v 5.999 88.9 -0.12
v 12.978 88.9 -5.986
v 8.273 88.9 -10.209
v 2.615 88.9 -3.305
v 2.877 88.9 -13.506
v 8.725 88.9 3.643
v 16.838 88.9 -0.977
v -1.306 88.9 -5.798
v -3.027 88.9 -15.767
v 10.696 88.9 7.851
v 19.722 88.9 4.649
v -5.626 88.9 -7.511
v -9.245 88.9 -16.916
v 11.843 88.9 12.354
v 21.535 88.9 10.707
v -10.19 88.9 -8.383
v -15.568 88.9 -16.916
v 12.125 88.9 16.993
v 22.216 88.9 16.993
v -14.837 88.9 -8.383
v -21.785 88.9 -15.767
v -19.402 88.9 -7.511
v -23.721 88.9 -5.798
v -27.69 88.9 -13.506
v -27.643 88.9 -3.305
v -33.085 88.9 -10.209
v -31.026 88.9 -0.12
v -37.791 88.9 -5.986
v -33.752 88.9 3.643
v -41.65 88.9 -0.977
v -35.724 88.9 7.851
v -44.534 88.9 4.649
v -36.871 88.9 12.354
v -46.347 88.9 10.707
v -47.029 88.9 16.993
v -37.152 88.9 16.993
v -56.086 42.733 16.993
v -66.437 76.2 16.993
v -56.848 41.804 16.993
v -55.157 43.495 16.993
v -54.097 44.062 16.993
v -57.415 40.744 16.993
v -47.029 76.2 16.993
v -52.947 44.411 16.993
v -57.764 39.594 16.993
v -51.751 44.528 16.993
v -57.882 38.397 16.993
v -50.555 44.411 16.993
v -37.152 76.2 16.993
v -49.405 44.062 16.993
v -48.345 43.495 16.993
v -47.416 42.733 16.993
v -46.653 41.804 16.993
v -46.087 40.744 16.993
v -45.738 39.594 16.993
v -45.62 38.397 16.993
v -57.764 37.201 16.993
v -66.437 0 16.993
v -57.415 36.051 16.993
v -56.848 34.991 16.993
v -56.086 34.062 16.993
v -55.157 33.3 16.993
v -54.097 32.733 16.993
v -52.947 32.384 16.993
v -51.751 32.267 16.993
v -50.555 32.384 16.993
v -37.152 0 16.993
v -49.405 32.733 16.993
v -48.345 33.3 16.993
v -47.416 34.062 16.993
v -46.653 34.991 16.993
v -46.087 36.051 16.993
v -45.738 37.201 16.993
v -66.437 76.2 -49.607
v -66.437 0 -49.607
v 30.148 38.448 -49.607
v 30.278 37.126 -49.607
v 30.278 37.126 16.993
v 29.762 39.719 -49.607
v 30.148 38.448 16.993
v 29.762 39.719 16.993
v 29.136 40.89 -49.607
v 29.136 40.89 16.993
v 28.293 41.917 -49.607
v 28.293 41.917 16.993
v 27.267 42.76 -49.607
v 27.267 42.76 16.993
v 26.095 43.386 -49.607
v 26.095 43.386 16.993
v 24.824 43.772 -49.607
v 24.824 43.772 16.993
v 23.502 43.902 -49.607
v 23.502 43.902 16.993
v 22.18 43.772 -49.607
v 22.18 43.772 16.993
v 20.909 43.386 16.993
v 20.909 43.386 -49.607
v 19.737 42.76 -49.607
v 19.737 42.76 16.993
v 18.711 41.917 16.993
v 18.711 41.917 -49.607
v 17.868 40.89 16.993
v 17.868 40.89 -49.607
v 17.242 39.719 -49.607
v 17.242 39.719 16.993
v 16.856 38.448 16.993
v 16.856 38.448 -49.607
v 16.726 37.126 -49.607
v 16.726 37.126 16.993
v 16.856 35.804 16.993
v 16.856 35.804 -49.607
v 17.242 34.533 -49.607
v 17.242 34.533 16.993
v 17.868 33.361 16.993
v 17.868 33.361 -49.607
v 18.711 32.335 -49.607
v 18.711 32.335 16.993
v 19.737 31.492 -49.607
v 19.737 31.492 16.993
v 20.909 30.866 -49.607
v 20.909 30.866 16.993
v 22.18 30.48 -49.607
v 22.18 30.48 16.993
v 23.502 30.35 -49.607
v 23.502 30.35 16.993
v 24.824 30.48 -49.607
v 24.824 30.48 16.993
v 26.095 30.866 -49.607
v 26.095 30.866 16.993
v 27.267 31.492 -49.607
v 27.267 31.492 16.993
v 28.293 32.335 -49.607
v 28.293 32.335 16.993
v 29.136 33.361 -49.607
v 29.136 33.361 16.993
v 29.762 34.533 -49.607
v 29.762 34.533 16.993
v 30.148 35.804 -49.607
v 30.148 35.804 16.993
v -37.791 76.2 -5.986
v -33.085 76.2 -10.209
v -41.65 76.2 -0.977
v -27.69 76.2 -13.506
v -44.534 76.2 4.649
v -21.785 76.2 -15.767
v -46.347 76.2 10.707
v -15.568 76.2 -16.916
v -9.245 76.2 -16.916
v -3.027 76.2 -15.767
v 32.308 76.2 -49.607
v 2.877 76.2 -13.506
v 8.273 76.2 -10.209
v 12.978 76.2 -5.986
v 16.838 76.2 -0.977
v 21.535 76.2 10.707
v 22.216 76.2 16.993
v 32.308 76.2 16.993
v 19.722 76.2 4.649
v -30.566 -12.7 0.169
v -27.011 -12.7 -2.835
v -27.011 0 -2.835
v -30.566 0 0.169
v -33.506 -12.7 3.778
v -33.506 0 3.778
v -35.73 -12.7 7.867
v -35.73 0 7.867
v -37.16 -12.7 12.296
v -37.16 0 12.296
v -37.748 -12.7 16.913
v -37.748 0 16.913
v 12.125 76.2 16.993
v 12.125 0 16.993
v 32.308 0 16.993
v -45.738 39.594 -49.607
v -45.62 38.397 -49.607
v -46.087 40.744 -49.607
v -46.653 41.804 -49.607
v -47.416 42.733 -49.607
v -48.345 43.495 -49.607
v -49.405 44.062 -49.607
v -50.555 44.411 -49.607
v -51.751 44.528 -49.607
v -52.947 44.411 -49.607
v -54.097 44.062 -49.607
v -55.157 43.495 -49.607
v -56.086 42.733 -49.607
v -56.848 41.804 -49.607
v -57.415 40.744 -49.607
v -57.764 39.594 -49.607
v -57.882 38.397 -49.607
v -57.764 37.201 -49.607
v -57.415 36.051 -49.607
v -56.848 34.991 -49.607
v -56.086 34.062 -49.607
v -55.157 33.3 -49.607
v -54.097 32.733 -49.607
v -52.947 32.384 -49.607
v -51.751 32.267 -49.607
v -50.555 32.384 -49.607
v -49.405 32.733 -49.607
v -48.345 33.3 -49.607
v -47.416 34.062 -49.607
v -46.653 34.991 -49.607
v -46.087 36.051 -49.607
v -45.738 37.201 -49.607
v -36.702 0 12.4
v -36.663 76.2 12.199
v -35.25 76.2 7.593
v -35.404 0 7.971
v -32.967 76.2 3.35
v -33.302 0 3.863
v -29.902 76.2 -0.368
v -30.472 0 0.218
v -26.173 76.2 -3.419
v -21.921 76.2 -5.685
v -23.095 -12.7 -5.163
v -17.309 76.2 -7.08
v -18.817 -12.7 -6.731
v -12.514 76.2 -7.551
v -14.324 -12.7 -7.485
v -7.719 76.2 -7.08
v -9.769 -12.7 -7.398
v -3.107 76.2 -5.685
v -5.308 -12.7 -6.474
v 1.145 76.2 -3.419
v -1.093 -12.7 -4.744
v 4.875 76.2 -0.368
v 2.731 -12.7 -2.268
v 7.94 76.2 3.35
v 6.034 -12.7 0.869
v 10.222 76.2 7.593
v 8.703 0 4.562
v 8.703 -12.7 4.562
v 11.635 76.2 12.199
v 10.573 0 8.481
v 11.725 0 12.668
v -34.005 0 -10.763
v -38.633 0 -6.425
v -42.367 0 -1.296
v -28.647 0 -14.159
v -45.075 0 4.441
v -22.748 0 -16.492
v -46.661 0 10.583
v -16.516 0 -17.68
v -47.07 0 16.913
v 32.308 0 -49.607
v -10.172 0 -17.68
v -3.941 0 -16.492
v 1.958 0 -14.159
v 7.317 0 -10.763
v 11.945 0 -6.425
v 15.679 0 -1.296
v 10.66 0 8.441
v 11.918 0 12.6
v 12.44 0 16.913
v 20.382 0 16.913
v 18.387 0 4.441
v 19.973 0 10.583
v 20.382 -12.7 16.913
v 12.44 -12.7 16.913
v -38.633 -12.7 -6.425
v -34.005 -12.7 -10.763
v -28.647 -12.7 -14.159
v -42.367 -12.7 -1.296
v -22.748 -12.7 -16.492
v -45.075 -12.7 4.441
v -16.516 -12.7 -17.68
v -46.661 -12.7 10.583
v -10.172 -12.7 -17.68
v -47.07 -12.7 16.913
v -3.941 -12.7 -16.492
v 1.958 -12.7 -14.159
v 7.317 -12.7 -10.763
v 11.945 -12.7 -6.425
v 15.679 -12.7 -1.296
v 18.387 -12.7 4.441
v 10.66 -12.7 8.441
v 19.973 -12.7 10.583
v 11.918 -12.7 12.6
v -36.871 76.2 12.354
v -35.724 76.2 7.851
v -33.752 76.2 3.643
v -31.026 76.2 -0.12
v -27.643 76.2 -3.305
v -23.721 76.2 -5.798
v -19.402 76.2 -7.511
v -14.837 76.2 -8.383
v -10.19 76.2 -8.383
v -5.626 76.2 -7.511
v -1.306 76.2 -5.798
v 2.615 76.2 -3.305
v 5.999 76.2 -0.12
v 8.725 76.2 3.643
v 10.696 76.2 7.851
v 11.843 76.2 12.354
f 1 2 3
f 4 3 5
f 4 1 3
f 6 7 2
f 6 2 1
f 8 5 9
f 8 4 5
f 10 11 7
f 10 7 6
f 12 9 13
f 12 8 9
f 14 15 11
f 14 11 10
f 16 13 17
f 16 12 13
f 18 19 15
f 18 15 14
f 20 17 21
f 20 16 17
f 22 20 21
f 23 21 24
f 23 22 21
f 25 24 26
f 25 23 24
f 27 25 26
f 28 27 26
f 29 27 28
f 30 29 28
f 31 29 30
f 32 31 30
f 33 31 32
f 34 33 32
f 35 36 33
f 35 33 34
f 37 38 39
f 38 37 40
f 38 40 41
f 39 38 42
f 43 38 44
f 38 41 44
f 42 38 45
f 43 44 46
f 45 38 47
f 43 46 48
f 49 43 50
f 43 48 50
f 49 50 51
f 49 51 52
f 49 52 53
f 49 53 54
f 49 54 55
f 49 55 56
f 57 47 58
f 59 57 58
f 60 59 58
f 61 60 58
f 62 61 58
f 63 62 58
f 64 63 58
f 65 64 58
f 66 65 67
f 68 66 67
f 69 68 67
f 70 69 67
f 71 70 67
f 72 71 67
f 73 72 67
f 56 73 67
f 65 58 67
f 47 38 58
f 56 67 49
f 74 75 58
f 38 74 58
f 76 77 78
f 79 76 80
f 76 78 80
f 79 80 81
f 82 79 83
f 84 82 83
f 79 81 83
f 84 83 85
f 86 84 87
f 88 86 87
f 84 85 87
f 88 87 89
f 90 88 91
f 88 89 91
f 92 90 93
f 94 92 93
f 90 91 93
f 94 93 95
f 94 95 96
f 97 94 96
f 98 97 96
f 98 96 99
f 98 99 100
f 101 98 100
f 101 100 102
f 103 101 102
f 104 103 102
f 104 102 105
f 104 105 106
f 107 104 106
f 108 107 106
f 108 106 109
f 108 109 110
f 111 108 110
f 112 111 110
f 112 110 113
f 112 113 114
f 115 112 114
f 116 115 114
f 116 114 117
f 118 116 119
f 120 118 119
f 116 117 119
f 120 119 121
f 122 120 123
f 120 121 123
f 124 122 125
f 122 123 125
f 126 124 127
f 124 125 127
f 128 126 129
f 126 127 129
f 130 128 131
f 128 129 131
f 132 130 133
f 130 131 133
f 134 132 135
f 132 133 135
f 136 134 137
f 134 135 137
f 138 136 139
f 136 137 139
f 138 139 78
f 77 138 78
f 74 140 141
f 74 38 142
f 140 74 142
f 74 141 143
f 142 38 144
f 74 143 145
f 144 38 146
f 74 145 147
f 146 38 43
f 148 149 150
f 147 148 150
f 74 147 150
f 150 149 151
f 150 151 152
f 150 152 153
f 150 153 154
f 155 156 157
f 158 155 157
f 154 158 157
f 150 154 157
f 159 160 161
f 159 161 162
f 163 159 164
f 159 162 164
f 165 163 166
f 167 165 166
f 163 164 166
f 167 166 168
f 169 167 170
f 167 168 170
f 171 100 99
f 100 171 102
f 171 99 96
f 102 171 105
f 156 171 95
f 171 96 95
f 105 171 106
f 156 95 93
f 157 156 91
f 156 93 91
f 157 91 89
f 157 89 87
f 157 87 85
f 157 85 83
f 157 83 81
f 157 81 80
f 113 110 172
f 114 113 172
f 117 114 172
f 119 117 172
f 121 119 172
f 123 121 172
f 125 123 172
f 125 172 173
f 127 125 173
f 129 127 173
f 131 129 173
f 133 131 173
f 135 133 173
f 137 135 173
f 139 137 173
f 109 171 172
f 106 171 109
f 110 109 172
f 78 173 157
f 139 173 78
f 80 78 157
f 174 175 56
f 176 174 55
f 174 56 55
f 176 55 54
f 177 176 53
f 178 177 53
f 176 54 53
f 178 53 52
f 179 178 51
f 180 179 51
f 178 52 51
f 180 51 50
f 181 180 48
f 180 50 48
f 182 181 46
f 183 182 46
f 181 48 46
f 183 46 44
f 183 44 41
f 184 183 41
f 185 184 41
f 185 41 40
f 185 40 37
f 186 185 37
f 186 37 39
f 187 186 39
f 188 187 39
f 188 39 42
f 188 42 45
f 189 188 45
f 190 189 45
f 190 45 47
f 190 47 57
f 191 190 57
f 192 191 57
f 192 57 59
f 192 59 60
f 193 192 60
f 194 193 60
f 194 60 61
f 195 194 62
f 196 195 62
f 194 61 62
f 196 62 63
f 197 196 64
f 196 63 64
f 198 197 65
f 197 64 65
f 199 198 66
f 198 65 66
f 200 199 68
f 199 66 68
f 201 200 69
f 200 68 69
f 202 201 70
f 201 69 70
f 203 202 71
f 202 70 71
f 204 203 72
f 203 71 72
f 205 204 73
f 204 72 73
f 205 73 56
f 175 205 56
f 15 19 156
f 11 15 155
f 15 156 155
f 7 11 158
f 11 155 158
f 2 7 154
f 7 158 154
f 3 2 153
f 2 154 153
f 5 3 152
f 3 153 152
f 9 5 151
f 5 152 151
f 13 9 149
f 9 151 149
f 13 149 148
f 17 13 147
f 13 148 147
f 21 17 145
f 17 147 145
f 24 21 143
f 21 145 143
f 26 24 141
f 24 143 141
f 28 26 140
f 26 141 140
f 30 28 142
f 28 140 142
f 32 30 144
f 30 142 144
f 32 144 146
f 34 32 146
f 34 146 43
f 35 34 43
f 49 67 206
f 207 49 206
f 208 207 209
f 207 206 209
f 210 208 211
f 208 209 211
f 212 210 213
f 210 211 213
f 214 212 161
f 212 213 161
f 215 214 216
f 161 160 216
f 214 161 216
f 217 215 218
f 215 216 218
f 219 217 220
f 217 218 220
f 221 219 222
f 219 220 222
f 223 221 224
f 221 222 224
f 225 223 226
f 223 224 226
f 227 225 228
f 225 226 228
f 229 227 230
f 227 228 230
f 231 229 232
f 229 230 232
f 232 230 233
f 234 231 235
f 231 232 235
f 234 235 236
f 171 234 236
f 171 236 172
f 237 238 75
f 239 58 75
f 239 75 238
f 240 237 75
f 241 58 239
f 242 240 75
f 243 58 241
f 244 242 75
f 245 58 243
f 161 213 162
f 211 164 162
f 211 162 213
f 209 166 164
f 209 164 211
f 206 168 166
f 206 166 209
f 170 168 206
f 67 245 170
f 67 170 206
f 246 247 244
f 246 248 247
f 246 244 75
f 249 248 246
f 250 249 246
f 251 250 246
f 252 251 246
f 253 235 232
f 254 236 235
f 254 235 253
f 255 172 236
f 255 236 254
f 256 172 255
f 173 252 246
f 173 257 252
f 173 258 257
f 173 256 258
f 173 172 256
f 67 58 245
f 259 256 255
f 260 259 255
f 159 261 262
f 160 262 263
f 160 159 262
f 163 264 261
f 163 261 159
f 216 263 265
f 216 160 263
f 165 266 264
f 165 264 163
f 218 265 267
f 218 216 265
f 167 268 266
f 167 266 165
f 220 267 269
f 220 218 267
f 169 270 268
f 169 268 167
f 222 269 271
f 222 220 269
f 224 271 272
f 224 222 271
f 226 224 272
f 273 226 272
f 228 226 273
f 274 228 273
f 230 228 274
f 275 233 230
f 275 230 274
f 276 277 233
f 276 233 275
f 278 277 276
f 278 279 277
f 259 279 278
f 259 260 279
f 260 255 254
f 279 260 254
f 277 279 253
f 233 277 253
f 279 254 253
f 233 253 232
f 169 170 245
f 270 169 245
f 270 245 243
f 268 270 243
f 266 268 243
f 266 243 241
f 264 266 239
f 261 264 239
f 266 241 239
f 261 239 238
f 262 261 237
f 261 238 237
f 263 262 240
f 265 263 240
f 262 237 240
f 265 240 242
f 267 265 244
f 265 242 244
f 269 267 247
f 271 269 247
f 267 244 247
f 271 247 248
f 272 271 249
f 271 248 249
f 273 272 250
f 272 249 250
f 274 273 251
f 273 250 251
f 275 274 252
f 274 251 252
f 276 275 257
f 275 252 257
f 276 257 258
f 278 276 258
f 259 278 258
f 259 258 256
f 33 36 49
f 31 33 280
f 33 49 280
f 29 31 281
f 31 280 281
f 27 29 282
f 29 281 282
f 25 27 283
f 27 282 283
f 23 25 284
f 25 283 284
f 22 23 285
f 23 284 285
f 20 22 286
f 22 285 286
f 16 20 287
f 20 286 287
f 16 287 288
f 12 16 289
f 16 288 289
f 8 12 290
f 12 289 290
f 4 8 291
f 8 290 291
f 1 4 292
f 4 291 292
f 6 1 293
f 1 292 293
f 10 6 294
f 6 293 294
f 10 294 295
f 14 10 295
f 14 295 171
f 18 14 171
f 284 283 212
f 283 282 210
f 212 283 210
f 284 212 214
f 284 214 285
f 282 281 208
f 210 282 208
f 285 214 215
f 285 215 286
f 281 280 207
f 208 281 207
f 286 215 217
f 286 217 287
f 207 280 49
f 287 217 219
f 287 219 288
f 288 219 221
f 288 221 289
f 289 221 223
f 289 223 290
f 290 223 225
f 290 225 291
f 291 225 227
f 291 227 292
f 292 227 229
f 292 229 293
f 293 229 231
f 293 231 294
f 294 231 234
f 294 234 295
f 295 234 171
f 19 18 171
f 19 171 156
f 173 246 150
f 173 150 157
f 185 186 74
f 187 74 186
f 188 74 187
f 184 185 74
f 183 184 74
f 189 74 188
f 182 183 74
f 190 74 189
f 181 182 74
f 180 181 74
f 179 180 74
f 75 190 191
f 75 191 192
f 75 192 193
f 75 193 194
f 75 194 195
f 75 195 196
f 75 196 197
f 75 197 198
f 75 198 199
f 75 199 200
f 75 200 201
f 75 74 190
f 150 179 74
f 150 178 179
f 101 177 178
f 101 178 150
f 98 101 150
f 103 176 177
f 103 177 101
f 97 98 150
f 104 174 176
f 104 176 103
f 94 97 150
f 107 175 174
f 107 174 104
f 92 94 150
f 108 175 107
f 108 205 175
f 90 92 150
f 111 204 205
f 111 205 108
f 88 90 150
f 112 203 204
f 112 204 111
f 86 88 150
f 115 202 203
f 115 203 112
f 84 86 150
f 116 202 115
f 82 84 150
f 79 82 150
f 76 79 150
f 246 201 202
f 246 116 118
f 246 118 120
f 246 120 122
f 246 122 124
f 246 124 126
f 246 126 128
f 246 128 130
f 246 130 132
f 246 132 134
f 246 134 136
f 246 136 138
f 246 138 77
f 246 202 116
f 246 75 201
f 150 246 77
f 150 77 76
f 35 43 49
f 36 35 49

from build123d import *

# Parameters (mm, degrees)
F0_W          = 98.744937
F0_H          = 66.599365
F1_DEPTH      = 76.2
F4_DEPTH      = 12.7
F5_R          = 24.638622
F6_DEPTH      = 12.7
F6_DEPTH_BACK = 88.9
F7_R          = 6.776006
F7_R_2        = 6.130863
F8_DEPTH      = 66.600365
F10_DEPTH     = 12.7


with BuildPart() as f1:
    # F0 (on Front) → F1 (new body)
    with BuildSketch(Plane.XZ):
        with Locations((-17.064217, -16.306898)):
            Rectangle(F0_W, F0_H)
    extrude(amount=-F1_DEPTH)

    # F3 (on face) → F4 (join)
    with BuildSketch(Plane.XZ):
        with BuildLine():
            ThreePointArc((12.440301, 16.913241), (-12.653938, -7.34435), (-37.748177, 16.913241))
            Line((-37.748177, 16.913241), (-47.070116, 16.913241))
            ThreePointArc((-47.070116, 16.913241), (-13.344199, -17.828973), (20.381717, 16.913241))
            Line((20.381717, 16.913241), (12.440301, 16.913241))
        make_face()
    extrude(amount=F4_DEPTH)

    # F5 (on Front) → F6 (cut, two sides)
    with BuildSketch(Plane.XZ) as f6_sk:
        with Locations((-12.513756, 17.087433)):
            Circle(F5_R)
    extrude(amount=F6_DEPTH, mode=Mode.SUBTRACT)
    extrude(f6_sk.sketch, amount=-F6_DEPTH_BACK, mode=Mode.SUBTRACT)

    # F7 (on face) → F8 (cut, through all)
    with BuildSketch(Plane.XY.offset(16.992785)):
        with Locations((23.502037, 37.125945)):
            Circle(F7_R)
        with Locations((-51.750846, 38.397469)):
            Circle(F7_R_2)
    extrude(amount=-F8_DEPTH, mode=Mode.SUBTRACT)

    # F9 (on face) → F10 (join)
    with BuildSketch(Plane(origin=(0, 76.2, 0), x_dir=(-1, 0, 0), z_dir=(0, 1, 0))):
        with BuildLine():
            ThreePointArc((37.152196, 16.992785), (12.513756, -8.492675), (-12.124685, 16.992785))
            Line((-12.124685, 16.992785), (-22.216468, 16.992785))
            ThreePointArc((-22.216468, 16.992785), (12.40618, -17.061067), (47.028828, 16.992785))
            Line((47.028828, 16.992785), (37.152196, 16.992785))
        make_face()
    extrude(amount=F10_DEPTH)


solid = f1.part
